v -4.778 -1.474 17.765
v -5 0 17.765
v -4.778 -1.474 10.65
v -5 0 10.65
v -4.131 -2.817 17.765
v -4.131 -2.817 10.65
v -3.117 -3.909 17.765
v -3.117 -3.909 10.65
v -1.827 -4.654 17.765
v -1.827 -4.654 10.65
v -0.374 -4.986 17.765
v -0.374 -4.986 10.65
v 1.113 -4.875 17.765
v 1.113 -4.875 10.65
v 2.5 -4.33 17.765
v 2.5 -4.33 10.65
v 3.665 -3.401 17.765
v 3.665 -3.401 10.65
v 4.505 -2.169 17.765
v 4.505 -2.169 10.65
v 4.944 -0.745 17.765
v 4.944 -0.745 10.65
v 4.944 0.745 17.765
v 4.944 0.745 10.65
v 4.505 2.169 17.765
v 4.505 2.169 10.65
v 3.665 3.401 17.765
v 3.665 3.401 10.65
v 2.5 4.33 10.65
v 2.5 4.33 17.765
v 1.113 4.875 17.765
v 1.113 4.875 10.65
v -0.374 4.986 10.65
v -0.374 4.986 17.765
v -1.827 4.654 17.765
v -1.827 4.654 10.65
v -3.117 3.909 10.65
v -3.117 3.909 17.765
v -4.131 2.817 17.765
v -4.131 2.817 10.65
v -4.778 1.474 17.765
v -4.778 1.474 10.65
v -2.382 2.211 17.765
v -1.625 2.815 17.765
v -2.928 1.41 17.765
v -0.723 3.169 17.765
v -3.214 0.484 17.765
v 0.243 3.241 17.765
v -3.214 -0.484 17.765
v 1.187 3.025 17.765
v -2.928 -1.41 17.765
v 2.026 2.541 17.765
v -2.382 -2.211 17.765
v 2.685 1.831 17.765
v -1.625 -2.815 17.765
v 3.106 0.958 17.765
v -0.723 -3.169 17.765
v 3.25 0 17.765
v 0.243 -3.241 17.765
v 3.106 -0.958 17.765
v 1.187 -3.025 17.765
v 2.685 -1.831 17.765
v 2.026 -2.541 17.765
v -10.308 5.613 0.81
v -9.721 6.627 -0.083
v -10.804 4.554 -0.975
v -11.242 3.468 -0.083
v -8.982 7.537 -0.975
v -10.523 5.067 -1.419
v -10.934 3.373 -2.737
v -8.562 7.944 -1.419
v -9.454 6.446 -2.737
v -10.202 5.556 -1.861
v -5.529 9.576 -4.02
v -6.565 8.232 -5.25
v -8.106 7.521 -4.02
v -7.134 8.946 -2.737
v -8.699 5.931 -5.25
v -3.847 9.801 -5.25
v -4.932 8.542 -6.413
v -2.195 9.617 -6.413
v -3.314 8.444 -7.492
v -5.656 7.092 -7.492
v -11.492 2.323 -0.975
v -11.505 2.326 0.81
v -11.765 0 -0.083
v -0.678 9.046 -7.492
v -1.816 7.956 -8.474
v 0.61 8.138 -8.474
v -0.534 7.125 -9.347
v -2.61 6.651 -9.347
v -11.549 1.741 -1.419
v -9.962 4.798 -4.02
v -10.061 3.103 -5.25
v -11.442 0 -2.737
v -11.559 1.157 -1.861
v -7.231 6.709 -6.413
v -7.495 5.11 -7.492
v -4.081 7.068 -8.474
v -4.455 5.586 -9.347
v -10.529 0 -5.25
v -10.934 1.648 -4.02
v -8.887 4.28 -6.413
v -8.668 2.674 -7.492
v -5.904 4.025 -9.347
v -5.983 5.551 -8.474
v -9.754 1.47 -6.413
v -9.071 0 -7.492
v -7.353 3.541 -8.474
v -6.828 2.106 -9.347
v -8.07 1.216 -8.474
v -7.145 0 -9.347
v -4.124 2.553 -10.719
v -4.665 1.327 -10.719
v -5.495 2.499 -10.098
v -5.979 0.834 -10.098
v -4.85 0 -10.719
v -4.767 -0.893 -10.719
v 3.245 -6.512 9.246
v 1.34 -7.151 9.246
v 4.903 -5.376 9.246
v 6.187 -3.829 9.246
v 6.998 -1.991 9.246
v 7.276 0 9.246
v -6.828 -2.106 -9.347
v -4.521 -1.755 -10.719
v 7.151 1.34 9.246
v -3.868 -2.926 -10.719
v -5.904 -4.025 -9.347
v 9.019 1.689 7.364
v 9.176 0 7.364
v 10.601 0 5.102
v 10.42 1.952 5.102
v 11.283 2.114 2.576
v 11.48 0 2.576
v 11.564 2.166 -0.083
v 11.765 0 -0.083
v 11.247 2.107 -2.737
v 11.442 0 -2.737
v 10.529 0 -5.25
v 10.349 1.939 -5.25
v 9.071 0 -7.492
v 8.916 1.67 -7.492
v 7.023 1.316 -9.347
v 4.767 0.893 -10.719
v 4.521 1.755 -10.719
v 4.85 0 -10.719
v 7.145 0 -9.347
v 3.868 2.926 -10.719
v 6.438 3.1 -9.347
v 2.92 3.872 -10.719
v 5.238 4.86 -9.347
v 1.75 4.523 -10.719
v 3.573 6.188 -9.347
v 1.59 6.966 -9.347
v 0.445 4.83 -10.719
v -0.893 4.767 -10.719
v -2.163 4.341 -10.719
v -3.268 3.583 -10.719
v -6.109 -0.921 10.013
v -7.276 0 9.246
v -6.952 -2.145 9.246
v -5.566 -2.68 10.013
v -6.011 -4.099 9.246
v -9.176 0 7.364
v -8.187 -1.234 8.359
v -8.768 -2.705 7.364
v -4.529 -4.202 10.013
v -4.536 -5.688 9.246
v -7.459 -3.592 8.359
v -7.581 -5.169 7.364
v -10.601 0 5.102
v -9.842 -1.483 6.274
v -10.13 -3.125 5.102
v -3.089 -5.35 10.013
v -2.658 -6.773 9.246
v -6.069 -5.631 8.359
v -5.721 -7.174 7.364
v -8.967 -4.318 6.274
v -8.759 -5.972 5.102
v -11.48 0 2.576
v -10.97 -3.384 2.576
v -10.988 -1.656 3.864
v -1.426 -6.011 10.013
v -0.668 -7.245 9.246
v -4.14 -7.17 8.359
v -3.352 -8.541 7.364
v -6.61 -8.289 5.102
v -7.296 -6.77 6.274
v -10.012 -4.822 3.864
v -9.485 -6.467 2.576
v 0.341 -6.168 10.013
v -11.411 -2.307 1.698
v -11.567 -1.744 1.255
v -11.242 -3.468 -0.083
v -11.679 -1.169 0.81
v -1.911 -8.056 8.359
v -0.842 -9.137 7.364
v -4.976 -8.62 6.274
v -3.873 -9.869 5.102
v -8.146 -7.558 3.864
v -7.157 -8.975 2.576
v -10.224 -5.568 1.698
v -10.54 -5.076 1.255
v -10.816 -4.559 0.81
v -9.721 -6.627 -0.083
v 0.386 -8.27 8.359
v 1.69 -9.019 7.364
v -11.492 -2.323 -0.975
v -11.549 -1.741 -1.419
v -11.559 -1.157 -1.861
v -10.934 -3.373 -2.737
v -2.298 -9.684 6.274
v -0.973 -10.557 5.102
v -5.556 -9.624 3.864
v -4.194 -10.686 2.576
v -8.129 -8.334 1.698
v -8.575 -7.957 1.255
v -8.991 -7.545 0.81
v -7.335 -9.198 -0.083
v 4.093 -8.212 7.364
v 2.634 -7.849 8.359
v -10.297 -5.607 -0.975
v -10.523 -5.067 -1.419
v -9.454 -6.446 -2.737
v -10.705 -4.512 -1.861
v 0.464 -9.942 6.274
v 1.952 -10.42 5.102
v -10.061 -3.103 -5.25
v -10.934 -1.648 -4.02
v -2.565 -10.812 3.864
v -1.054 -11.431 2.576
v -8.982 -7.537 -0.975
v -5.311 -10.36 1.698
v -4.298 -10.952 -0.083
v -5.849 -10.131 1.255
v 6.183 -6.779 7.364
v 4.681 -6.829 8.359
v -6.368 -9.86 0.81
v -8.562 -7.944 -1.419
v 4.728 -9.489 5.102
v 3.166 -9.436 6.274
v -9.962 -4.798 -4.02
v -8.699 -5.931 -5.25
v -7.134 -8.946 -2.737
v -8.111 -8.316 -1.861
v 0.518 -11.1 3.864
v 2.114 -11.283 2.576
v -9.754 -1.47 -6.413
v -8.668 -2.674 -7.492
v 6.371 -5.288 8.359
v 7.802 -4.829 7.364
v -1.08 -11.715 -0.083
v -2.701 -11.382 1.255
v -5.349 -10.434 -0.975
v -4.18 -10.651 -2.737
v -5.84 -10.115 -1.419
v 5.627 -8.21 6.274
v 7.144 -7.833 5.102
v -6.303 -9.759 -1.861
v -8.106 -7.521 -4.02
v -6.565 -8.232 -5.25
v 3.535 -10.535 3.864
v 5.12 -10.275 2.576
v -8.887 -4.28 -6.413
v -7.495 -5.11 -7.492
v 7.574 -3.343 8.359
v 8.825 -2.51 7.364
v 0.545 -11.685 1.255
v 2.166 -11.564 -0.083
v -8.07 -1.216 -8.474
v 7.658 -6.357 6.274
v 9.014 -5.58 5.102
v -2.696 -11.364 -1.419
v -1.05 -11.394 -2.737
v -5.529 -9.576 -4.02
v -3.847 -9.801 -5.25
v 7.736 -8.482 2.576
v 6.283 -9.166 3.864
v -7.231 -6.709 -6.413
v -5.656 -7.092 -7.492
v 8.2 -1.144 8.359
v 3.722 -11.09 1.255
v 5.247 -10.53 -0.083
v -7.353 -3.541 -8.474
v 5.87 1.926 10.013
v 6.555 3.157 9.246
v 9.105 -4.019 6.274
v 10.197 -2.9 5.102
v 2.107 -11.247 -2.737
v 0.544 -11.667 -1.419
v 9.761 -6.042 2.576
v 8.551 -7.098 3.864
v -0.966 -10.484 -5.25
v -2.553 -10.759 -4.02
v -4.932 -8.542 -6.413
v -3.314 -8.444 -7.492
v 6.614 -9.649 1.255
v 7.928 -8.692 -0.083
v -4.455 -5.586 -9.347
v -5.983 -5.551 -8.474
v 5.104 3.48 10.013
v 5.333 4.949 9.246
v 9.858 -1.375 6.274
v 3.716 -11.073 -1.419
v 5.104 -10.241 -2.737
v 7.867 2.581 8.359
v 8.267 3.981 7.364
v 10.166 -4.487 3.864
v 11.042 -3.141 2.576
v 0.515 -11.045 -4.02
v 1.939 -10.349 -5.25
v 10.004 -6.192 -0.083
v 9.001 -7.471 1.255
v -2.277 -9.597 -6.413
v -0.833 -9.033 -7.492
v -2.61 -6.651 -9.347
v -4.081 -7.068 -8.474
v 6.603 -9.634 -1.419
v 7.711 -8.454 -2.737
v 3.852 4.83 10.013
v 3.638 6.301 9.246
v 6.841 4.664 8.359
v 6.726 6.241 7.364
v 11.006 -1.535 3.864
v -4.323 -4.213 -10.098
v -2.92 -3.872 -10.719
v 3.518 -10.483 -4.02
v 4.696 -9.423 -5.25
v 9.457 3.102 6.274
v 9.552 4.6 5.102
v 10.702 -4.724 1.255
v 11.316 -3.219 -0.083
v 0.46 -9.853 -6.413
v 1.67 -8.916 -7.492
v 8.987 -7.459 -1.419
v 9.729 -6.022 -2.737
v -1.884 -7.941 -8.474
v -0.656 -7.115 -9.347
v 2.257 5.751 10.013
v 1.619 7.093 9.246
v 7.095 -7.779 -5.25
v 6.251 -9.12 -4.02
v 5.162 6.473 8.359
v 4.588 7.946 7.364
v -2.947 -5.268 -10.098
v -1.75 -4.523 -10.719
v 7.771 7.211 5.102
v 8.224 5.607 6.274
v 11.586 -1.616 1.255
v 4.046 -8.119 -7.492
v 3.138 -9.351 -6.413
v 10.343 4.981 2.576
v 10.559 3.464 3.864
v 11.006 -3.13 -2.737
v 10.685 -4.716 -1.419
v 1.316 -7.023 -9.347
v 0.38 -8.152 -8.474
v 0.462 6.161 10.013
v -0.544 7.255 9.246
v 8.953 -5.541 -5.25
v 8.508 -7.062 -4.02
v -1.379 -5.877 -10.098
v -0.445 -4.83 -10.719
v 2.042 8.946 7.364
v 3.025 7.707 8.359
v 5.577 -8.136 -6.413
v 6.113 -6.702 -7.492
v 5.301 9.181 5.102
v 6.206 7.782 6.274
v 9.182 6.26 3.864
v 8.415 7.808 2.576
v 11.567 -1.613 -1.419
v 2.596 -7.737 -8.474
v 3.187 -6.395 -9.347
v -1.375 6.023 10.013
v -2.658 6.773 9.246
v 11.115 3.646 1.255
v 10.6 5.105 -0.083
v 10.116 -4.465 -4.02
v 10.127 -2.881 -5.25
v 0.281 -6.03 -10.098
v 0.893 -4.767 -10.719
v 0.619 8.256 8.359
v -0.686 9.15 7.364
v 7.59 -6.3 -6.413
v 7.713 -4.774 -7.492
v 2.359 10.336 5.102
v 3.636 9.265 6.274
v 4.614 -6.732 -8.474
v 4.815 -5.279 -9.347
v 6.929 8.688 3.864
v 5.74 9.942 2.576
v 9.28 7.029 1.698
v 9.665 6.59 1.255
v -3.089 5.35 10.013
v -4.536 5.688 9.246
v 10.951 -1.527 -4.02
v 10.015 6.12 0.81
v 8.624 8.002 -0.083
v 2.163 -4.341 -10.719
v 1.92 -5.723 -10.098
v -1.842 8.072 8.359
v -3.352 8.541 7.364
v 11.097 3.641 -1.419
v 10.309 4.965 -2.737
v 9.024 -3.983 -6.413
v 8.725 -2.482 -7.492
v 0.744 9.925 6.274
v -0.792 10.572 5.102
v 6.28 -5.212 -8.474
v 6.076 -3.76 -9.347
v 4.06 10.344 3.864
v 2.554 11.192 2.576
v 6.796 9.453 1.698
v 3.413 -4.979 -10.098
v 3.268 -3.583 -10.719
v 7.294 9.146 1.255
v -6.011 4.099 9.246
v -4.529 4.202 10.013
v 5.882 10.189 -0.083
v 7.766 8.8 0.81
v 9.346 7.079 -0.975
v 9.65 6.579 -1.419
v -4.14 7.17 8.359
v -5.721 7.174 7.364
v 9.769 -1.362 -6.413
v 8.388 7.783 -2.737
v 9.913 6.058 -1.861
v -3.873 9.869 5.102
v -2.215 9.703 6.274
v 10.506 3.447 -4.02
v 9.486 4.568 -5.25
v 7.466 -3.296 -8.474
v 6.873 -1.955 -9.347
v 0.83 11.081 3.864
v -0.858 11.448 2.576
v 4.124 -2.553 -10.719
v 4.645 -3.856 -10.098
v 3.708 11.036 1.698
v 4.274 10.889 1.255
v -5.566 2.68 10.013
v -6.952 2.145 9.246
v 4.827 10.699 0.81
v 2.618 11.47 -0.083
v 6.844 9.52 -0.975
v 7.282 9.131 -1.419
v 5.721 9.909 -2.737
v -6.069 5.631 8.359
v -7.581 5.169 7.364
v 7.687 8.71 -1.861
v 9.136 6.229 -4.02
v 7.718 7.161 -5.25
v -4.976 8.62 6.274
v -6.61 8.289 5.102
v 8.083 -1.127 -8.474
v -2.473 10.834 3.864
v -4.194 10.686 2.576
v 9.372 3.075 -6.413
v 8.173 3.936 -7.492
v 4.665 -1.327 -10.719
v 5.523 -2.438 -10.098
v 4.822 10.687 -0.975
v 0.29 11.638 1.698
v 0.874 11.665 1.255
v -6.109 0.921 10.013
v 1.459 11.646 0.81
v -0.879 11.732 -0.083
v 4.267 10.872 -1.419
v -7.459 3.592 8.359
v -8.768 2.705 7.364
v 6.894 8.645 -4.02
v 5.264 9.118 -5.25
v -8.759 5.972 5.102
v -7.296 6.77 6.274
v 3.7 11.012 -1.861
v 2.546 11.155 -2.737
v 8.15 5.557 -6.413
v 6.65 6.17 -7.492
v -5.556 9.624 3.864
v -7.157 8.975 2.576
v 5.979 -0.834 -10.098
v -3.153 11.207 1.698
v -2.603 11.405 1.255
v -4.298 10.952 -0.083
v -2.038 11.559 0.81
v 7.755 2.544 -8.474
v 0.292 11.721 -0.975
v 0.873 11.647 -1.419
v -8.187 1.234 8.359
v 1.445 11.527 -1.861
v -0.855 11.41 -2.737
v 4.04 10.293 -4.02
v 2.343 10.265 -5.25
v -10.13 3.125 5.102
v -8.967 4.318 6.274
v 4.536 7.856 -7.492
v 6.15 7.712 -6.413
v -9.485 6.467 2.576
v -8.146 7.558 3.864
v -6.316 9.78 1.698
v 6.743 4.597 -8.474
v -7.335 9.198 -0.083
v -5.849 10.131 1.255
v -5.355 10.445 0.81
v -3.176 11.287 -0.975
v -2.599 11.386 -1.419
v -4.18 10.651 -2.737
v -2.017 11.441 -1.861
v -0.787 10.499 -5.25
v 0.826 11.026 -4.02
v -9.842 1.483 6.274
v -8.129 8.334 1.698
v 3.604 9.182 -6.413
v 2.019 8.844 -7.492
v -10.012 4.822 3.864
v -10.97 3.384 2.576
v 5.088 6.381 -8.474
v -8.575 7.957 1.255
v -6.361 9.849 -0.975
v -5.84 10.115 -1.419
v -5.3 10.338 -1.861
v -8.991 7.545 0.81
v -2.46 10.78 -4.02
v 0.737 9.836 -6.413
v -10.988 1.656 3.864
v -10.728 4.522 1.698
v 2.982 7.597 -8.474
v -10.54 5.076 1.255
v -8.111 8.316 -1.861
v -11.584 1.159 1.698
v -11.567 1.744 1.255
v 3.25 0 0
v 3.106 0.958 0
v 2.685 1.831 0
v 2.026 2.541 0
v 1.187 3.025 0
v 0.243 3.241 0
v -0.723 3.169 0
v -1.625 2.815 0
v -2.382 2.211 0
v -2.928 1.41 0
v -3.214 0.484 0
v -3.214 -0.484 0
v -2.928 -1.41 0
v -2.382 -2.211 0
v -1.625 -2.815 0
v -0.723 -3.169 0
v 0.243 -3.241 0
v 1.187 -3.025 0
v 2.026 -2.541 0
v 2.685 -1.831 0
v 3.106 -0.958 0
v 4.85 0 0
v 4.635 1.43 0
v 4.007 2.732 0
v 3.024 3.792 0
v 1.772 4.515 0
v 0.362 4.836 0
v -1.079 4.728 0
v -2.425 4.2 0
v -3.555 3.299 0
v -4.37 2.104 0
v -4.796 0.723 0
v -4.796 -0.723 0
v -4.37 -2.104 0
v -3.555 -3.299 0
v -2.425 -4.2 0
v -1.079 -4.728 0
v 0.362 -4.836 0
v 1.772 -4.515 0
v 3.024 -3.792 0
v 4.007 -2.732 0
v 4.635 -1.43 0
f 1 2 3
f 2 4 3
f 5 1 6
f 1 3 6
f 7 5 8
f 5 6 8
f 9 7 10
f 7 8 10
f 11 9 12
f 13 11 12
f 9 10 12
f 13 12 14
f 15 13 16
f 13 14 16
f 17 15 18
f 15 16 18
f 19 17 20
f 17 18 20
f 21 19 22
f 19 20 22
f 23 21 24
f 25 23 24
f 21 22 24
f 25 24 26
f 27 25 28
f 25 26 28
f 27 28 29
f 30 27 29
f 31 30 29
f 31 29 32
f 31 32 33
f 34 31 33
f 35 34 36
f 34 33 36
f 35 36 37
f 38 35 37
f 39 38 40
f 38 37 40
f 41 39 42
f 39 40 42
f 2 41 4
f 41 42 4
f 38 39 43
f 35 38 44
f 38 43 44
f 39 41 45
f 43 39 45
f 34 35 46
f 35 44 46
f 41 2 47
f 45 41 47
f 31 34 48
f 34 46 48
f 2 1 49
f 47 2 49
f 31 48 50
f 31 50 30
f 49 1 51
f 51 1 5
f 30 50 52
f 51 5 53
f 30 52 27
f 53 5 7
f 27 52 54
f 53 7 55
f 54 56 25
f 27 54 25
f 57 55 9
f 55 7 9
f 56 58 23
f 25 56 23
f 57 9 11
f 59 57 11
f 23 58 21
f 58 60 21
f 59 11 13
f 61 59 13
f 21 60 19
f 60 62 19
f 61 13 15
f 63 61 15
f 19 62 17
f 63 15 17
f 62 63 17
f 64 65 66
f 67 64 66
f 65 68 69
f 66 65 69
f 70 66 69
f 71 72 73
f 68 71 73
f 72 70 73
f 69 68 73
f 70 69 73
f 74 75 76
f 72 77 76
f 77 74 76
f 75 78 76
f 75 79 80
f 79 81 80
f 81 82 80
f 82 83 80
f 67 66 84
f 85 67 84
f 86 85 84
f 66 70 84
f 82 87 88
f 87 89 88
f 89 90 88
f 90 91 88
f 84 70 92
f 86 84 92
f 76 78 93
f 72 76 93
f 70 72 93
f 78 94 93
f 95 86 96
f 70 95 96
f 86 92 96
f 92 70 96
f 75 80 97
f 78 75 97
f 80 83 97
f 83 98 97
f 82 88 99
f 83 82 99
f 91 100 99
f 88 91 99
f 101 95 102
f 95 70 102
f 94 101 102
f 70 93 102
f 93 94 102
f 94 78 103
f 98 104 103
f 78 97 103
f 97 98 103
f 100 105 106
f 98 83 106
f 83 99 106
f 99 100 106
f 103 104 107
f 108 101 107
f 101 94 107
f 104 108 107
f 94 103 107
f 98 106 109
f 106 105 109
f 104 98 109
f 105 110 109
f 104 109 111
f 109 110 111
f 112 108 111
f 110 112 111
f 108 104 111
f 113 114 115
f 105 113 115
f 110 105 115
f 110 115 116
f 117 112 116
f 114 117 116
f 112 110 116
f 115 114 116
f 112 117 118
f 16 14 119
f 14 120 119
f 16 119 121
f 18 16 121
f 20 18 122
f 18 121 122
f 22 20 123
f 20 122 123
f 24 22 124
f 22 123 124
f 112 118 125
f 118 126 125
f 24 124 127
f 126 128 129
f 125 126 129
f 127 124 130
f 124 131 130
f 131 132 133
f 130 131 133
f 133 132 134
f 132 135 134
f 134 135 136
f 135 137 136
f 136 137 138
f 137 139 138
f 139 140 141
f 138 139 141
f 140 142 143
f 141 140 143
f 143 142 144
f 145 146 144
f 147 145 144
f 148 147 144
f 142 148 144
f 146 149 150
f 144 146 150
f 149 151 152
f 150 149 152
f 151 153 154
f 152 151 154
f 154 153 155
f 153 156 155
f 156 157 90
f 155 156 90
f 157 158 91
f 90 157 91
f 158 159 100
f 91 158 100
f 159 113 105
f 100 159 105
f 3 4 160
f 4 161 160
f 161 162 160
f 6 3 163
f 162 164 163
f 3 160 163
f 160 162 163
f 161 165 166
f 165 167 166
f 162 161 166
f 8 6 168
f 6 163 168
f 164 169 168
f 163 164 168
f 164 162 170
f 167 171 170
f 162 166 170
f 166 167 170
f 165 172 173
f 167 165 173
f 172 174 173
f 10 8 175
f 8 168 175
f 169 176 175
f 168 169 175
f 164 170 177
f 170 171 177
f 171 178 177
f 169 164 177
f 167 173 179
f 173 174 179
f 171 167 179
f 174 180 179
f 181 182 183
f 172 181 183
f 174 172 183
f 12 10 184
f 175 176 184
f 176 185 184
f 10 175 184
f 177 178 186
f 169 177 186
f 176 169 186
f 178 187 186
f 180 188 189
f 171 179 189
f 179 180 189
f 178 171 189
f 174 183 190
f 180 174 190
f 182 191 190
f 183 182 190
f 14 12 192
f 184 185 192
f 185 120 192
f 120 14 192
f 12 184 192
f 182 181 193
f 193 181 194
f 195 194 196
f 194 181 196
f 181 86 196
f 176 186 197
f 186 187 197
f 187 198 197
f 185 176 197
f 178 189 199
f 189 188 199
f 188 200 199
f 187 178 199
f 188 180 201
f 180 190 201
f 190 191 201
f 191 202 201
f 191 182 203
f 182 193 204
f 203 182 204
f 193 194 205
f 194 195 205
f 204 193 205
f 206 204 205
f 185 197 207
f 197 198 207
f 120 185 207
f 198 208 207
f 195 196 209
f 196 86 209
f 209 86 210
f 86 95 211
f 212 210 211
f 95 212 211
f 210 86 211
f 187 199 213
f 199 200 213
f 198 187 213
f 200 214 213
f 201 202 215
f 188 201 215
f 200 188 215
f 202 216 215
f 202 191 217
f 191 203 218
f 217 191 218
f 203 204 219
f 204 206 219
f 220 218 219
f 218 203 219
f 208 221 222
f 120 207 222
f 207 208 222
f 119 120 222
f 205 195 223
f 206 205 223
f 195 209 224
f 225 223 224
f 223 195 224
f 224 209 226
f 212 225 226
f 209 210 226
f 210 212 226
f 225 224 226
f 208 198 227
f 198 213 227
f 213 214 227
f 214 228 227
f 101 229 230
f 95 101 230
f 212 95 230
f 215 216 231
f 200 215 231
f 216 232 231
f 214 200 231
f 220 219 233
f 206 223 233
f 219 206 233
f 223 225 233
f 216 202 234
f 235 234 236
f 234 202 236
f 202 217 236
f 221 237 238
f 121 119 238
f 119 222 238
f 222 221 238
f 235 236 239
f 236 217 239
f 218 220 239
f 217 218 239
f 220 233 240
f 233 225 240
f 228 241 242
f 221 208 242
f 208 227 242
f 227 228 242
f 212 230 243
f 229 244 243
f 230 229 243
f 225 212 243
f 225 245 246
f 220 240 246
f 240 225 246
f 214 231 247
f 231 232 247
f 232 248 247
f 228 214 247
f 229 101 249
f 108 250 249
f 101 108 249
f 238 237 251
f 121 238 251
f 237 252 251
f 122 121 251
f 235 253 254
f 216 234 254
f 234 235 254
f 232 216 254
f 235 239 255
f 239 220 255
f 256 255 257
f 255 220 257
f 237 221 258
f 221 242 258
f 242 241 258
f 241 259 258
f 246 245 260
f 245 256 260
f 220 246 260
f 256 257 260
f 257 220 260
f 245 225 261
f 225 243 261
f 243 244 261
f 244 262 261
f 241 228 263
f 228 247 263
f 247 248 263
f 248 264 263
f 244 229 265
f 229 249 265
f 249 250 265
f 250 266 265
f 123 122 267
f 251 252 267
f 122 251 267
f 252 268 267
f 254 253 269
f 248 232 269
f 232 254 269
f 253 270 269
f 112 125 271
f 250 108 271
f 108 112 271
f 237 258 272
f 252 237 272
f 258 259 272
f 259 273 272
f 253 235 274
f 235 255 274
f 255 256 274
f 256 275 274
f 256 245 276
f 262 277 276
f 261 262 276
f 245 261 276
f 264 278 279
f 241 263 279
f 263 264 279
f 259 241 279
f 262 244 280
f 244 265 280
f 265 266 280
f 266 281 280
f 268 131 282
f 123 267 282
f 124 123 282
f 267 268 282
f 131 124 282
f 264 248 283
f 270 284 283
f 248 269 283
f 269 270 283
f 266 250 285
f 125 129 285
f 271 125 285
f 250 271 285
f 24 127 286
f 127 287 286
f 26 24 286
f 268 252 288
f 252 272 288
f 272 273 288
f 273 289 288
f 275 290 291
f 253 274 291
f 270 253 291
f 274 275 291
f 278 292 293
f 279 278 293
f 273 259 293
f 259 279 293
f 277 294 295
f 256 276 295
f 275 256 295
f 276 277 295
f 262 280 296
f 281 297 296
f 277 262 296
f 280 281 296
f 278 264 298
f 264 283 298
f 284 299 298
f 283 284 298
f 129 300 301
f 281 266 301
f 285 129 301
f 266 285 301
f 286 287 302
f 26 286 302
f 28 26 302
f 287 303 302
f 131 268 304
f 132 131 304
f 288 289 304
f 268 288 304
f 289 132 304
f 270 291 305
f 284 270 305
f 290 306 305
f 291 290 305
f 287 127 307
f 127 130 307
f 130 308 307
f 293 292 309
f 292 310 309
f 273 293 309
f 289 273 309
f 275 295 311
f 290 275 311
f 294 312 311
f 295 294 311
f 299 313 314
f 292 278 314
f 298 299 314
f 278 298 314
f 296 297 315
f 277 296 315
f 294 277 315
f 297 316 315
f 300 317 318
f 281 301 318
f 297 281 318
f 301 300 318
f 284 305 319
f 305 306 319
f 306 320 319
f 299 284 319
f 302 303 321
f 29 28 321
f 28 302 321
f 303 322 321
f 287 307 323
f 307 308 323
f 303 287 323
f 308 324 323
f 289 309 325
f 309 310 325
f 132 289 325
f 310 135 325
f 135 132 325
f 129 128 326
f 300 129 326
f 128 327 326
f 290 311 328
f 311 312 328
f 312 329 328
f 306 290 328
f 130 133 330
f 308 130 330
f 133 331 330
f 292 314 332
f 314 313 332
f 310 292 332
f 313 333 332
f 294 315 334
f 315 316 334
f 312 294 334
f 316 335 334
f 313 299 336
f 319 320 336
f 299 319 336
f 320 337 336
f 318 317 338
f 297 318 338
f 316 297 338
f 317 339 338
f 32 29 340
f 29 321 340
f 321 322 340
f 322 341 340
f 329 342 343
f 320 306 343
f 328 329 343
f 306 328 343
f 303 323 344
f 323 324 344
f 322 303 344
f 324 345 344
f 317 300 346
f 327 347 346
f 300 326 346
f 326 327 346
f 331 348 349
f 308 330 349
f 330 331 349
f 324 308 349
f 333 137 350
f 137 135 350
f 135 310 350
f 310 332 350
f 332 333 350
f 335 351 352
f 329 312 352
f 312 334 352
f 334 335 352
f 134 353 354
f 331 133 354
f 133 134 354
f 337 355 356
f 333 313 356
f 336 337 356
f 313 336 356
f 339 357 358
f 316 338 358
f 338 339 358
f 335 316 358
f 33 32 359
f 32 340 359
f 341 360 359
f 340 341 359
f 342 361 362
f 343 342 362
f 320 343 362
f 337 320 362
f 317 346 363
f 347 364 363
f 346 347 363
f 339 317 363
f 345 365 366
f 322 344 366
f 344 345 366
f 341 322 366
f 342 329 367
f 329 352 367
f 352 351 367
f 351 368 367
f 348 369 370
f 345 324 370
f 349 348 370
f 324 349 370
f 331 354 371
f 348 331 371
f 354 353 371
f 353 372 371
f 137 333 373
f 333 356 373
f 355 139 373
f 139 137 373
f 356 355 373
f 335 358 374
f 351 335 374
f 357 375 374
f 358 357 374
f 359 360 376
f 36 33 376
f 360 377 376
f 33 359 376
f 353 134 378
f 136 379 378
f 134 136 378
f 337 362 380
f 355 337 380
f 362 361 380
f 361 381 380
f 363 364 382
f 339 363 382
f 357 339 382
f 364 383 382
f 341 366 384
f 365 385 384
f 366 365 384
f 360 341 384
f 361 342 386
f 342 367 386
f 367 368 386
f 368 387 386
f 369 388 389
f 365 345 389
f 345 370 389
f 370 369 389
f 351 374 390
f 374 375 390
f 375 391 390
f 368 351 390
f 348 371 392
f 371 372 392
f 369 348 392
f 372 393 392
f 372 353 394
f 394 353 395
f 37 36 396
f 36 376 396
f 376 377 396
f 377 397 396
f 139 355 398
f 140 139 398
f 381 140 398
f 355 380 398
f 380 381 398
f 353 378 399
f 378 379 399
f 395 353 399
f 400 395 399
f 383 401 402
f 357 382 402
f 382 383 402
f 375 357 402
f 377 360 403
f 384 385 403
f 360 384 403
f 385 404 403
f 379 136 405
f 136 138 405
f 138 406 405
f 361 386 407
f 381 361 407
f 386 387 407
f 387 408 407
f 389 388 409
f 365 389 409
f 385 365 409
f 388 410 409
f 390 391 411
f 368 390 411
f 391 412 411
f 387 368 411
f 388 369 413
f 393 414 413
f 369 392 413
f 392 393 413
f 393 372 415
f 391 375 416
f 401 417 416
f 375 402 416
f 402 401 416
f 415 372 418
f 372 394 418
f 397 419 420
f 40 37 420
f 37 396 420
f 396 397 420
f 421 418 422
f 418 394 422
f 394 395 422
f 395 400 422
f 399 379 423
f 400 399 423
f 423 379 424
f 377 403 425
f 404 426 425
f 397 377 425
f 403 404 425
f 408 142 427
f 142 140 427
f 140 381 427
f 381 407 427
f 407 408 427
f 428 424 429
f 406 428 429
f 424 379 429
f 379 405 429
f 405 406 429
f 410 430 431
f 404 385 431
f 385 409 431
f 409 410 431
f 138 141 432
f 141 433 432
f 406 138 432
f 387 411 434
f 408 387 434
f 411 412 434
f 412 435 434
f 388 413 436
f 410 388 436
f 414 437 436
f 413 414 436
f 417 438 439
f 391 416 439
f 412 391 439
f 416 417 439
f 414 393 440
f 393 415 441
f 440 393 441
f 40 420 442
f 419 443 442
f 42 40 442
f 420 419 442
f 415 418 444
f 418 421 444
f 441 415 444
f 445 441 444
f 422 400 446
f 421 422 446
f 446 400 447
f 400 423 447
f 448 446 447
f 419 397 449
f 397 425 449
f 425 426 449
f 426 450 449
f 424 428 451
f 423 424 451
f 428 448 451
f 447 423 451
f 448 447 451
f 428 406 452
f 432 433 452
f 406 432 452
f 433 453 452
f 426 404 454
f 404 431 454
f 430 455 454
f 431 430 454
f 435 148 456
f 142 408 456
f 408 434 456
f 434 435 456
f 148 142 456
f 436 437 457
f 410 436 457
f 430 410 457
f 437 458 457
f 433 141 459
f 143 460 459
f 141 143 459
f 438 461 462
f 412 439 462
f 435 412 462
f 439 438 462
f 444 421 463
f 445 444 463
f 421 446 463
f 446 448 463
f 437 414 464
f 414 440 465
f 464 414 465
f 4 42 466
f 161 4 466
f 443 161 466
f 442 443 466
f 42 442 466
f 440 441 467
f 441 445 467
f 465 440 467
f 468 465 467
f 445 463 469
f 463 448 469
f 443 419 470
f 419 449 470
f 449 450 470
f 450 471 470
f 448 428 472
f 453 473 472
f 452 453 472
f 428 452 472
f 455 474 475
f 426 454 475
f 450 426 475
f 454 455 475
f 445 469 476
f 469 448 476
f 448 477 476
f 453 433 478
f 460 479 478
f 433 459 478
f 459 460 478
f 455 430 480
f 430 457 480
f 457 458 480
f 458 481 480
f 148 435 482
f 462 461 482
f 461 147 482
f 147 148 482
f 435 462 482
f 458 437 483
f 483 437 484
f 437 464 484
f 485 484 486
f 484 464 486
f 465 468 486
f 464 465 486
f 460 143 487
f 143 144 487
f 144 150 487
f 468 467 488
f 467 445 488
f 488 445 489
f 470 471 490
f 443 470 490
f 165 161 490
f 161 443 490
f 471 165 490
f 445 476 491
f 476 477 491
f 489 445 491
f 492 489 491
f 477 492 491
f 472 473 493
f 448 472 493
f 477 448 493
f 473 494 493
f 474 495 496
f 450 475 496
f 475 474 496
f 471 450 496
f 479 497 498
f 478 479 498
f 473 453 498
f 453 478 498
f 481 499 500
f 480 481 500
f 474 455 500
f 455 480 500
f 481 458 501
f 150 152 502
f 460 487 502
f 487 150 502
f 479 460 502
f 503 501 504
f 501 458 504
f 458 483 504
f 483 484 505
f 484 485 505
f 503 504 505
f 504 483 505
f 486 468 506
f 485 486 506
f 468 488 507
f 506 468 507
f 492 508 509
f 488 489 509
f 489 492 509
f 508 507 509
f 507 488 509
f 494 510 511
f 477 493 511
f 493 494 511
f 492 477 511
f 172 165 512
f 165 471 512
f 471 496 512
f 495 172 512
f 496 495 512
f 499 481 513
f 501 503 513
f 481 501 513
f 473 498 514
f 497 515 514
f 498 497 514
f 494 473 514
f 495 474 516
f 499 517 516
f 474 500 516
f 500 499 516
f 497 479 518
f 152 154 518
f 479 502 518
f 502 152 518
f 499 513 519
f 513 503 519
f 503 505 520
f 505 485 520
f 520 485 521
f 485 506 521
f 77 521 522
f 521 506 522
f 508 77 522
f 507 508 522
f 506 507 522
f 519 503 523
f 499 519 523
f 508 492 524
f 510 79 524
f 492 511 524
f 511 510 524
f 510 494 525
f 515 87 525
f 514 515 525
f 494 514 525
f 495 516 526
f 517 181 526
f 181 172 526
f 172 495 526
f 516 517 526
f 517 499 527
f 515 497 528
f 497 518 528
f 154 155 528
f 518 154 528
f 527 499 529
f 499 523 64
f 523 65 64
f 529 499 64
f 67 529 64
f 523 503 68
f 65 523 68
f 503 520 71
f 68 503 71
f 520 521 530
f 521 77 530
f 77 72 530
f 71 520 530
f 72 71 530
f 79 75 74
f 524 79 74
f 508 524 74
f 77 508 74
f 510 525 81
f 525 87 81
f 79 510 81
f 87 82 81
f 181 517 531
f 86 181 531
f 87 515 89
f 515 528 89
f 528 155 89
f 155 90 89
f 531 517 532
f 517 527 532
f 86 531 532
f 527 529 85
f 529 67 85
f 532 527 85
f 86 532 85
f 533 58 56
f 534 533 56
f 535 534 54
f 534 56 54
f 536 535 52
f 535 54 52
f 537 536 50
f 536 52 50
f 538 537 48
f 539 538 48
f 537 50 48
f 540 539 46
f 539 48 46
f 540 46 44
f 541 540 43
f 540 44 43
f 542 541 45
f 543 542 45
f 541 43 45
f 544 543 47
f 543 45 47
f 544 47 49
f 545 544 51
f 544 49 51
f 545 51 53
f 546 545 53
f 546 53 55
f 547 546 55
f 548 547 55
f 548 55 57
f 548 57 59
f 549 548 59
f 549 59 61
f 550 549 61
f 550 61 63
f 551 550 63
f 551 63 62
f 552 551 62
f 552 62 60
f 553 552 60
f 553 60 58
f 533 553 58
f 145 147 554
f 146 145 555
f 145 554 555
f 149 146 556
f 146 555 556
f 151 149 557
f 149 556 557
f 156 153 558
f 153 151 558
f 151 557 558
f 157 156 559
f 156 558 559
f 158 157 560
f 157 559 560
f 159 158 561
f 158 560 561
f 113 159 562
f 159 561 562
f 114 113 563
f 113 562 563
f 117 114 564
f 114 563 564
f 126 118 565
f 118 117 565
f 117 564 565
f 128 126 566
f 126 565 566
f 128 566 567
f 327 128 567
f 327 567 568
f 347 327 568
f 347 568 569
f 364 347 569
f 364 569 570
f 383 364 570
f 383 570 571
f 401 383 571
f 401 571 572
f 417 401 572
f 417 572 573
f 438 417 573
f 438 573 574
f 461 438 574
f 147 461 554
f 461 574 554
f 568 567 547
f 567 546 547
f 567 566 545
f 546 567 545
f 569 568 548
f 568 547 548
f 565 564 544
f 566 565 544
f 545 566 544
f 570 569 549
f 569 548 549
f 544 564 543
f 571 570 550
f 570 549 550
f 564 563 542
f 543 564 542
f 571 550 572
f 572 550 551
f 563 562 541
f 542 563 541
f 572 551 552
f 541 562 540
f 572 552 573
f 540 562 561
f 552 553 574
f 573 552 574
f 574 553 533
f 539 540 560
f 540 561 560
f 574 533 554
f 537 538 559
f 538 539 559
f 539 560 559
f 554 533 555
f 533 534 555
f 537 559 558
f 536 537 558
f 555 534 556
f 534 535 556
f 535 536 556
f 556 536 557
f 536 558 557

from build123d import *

# Parameters (mm, degrees)
F2_R     = 3.25
F3_DEPTH = 29.531188
F4_R     = 4.85
F5_DEPTH = 25


with BuildPart() as f1:
    # F0 (on Front) → F1 (revolve)
    with BuildSketch(Plane.XZ):
        with BuildLine():
            Line((0, -11.765188), (0, 0))
            Line((0, 0), (-5, 0))
            Line((-5, 0), (-5, 10.649866))
            ThreePointArc((-5, 10.649866), (-11.482973, -2.561442), (0, -11.765188))
        make_face()
        with BuildLine():
            Line((-5, 0), (0, 0))
            Line((0, 0), (0, 11.765188))
            ThreePointArc((0, 11.765188), (-2.561442, 11.482973), (-5, 10.649866))
            Line((-5, 10.649866), (-5, 0))
        make_face()
        with BuildLine():
            ThreePointArc((-5, 10.649866), (-2.561442, 11.482973), (0, 11.765188))
            Line((0, 11.765188), (0, 17.765))
            Line((0, 17.765), (-5, 17.765))
            Line((-5, 17.765), (-5, 10.649866))
        make_face()
    revolve(axis=Axis((0, 0, 8.8825), (0, 0, 1)))

    # F2 (on face) → F3 (cut, through all)
    with BuildSketch(Plane.XY.offset(17.765)):
        Circle(F2_R)
    extrude(amount=-F3_DEPTH, mode=Mode.SUBTRACT)

    # F4 (on Top) → F5 (cut)
    with BuildSketch(Plane.XY):
        Circle(F4_R)
    extrude(amount=-F5_DEPTH, mode=Mode.SUBTRACT)


solid = f1.part
